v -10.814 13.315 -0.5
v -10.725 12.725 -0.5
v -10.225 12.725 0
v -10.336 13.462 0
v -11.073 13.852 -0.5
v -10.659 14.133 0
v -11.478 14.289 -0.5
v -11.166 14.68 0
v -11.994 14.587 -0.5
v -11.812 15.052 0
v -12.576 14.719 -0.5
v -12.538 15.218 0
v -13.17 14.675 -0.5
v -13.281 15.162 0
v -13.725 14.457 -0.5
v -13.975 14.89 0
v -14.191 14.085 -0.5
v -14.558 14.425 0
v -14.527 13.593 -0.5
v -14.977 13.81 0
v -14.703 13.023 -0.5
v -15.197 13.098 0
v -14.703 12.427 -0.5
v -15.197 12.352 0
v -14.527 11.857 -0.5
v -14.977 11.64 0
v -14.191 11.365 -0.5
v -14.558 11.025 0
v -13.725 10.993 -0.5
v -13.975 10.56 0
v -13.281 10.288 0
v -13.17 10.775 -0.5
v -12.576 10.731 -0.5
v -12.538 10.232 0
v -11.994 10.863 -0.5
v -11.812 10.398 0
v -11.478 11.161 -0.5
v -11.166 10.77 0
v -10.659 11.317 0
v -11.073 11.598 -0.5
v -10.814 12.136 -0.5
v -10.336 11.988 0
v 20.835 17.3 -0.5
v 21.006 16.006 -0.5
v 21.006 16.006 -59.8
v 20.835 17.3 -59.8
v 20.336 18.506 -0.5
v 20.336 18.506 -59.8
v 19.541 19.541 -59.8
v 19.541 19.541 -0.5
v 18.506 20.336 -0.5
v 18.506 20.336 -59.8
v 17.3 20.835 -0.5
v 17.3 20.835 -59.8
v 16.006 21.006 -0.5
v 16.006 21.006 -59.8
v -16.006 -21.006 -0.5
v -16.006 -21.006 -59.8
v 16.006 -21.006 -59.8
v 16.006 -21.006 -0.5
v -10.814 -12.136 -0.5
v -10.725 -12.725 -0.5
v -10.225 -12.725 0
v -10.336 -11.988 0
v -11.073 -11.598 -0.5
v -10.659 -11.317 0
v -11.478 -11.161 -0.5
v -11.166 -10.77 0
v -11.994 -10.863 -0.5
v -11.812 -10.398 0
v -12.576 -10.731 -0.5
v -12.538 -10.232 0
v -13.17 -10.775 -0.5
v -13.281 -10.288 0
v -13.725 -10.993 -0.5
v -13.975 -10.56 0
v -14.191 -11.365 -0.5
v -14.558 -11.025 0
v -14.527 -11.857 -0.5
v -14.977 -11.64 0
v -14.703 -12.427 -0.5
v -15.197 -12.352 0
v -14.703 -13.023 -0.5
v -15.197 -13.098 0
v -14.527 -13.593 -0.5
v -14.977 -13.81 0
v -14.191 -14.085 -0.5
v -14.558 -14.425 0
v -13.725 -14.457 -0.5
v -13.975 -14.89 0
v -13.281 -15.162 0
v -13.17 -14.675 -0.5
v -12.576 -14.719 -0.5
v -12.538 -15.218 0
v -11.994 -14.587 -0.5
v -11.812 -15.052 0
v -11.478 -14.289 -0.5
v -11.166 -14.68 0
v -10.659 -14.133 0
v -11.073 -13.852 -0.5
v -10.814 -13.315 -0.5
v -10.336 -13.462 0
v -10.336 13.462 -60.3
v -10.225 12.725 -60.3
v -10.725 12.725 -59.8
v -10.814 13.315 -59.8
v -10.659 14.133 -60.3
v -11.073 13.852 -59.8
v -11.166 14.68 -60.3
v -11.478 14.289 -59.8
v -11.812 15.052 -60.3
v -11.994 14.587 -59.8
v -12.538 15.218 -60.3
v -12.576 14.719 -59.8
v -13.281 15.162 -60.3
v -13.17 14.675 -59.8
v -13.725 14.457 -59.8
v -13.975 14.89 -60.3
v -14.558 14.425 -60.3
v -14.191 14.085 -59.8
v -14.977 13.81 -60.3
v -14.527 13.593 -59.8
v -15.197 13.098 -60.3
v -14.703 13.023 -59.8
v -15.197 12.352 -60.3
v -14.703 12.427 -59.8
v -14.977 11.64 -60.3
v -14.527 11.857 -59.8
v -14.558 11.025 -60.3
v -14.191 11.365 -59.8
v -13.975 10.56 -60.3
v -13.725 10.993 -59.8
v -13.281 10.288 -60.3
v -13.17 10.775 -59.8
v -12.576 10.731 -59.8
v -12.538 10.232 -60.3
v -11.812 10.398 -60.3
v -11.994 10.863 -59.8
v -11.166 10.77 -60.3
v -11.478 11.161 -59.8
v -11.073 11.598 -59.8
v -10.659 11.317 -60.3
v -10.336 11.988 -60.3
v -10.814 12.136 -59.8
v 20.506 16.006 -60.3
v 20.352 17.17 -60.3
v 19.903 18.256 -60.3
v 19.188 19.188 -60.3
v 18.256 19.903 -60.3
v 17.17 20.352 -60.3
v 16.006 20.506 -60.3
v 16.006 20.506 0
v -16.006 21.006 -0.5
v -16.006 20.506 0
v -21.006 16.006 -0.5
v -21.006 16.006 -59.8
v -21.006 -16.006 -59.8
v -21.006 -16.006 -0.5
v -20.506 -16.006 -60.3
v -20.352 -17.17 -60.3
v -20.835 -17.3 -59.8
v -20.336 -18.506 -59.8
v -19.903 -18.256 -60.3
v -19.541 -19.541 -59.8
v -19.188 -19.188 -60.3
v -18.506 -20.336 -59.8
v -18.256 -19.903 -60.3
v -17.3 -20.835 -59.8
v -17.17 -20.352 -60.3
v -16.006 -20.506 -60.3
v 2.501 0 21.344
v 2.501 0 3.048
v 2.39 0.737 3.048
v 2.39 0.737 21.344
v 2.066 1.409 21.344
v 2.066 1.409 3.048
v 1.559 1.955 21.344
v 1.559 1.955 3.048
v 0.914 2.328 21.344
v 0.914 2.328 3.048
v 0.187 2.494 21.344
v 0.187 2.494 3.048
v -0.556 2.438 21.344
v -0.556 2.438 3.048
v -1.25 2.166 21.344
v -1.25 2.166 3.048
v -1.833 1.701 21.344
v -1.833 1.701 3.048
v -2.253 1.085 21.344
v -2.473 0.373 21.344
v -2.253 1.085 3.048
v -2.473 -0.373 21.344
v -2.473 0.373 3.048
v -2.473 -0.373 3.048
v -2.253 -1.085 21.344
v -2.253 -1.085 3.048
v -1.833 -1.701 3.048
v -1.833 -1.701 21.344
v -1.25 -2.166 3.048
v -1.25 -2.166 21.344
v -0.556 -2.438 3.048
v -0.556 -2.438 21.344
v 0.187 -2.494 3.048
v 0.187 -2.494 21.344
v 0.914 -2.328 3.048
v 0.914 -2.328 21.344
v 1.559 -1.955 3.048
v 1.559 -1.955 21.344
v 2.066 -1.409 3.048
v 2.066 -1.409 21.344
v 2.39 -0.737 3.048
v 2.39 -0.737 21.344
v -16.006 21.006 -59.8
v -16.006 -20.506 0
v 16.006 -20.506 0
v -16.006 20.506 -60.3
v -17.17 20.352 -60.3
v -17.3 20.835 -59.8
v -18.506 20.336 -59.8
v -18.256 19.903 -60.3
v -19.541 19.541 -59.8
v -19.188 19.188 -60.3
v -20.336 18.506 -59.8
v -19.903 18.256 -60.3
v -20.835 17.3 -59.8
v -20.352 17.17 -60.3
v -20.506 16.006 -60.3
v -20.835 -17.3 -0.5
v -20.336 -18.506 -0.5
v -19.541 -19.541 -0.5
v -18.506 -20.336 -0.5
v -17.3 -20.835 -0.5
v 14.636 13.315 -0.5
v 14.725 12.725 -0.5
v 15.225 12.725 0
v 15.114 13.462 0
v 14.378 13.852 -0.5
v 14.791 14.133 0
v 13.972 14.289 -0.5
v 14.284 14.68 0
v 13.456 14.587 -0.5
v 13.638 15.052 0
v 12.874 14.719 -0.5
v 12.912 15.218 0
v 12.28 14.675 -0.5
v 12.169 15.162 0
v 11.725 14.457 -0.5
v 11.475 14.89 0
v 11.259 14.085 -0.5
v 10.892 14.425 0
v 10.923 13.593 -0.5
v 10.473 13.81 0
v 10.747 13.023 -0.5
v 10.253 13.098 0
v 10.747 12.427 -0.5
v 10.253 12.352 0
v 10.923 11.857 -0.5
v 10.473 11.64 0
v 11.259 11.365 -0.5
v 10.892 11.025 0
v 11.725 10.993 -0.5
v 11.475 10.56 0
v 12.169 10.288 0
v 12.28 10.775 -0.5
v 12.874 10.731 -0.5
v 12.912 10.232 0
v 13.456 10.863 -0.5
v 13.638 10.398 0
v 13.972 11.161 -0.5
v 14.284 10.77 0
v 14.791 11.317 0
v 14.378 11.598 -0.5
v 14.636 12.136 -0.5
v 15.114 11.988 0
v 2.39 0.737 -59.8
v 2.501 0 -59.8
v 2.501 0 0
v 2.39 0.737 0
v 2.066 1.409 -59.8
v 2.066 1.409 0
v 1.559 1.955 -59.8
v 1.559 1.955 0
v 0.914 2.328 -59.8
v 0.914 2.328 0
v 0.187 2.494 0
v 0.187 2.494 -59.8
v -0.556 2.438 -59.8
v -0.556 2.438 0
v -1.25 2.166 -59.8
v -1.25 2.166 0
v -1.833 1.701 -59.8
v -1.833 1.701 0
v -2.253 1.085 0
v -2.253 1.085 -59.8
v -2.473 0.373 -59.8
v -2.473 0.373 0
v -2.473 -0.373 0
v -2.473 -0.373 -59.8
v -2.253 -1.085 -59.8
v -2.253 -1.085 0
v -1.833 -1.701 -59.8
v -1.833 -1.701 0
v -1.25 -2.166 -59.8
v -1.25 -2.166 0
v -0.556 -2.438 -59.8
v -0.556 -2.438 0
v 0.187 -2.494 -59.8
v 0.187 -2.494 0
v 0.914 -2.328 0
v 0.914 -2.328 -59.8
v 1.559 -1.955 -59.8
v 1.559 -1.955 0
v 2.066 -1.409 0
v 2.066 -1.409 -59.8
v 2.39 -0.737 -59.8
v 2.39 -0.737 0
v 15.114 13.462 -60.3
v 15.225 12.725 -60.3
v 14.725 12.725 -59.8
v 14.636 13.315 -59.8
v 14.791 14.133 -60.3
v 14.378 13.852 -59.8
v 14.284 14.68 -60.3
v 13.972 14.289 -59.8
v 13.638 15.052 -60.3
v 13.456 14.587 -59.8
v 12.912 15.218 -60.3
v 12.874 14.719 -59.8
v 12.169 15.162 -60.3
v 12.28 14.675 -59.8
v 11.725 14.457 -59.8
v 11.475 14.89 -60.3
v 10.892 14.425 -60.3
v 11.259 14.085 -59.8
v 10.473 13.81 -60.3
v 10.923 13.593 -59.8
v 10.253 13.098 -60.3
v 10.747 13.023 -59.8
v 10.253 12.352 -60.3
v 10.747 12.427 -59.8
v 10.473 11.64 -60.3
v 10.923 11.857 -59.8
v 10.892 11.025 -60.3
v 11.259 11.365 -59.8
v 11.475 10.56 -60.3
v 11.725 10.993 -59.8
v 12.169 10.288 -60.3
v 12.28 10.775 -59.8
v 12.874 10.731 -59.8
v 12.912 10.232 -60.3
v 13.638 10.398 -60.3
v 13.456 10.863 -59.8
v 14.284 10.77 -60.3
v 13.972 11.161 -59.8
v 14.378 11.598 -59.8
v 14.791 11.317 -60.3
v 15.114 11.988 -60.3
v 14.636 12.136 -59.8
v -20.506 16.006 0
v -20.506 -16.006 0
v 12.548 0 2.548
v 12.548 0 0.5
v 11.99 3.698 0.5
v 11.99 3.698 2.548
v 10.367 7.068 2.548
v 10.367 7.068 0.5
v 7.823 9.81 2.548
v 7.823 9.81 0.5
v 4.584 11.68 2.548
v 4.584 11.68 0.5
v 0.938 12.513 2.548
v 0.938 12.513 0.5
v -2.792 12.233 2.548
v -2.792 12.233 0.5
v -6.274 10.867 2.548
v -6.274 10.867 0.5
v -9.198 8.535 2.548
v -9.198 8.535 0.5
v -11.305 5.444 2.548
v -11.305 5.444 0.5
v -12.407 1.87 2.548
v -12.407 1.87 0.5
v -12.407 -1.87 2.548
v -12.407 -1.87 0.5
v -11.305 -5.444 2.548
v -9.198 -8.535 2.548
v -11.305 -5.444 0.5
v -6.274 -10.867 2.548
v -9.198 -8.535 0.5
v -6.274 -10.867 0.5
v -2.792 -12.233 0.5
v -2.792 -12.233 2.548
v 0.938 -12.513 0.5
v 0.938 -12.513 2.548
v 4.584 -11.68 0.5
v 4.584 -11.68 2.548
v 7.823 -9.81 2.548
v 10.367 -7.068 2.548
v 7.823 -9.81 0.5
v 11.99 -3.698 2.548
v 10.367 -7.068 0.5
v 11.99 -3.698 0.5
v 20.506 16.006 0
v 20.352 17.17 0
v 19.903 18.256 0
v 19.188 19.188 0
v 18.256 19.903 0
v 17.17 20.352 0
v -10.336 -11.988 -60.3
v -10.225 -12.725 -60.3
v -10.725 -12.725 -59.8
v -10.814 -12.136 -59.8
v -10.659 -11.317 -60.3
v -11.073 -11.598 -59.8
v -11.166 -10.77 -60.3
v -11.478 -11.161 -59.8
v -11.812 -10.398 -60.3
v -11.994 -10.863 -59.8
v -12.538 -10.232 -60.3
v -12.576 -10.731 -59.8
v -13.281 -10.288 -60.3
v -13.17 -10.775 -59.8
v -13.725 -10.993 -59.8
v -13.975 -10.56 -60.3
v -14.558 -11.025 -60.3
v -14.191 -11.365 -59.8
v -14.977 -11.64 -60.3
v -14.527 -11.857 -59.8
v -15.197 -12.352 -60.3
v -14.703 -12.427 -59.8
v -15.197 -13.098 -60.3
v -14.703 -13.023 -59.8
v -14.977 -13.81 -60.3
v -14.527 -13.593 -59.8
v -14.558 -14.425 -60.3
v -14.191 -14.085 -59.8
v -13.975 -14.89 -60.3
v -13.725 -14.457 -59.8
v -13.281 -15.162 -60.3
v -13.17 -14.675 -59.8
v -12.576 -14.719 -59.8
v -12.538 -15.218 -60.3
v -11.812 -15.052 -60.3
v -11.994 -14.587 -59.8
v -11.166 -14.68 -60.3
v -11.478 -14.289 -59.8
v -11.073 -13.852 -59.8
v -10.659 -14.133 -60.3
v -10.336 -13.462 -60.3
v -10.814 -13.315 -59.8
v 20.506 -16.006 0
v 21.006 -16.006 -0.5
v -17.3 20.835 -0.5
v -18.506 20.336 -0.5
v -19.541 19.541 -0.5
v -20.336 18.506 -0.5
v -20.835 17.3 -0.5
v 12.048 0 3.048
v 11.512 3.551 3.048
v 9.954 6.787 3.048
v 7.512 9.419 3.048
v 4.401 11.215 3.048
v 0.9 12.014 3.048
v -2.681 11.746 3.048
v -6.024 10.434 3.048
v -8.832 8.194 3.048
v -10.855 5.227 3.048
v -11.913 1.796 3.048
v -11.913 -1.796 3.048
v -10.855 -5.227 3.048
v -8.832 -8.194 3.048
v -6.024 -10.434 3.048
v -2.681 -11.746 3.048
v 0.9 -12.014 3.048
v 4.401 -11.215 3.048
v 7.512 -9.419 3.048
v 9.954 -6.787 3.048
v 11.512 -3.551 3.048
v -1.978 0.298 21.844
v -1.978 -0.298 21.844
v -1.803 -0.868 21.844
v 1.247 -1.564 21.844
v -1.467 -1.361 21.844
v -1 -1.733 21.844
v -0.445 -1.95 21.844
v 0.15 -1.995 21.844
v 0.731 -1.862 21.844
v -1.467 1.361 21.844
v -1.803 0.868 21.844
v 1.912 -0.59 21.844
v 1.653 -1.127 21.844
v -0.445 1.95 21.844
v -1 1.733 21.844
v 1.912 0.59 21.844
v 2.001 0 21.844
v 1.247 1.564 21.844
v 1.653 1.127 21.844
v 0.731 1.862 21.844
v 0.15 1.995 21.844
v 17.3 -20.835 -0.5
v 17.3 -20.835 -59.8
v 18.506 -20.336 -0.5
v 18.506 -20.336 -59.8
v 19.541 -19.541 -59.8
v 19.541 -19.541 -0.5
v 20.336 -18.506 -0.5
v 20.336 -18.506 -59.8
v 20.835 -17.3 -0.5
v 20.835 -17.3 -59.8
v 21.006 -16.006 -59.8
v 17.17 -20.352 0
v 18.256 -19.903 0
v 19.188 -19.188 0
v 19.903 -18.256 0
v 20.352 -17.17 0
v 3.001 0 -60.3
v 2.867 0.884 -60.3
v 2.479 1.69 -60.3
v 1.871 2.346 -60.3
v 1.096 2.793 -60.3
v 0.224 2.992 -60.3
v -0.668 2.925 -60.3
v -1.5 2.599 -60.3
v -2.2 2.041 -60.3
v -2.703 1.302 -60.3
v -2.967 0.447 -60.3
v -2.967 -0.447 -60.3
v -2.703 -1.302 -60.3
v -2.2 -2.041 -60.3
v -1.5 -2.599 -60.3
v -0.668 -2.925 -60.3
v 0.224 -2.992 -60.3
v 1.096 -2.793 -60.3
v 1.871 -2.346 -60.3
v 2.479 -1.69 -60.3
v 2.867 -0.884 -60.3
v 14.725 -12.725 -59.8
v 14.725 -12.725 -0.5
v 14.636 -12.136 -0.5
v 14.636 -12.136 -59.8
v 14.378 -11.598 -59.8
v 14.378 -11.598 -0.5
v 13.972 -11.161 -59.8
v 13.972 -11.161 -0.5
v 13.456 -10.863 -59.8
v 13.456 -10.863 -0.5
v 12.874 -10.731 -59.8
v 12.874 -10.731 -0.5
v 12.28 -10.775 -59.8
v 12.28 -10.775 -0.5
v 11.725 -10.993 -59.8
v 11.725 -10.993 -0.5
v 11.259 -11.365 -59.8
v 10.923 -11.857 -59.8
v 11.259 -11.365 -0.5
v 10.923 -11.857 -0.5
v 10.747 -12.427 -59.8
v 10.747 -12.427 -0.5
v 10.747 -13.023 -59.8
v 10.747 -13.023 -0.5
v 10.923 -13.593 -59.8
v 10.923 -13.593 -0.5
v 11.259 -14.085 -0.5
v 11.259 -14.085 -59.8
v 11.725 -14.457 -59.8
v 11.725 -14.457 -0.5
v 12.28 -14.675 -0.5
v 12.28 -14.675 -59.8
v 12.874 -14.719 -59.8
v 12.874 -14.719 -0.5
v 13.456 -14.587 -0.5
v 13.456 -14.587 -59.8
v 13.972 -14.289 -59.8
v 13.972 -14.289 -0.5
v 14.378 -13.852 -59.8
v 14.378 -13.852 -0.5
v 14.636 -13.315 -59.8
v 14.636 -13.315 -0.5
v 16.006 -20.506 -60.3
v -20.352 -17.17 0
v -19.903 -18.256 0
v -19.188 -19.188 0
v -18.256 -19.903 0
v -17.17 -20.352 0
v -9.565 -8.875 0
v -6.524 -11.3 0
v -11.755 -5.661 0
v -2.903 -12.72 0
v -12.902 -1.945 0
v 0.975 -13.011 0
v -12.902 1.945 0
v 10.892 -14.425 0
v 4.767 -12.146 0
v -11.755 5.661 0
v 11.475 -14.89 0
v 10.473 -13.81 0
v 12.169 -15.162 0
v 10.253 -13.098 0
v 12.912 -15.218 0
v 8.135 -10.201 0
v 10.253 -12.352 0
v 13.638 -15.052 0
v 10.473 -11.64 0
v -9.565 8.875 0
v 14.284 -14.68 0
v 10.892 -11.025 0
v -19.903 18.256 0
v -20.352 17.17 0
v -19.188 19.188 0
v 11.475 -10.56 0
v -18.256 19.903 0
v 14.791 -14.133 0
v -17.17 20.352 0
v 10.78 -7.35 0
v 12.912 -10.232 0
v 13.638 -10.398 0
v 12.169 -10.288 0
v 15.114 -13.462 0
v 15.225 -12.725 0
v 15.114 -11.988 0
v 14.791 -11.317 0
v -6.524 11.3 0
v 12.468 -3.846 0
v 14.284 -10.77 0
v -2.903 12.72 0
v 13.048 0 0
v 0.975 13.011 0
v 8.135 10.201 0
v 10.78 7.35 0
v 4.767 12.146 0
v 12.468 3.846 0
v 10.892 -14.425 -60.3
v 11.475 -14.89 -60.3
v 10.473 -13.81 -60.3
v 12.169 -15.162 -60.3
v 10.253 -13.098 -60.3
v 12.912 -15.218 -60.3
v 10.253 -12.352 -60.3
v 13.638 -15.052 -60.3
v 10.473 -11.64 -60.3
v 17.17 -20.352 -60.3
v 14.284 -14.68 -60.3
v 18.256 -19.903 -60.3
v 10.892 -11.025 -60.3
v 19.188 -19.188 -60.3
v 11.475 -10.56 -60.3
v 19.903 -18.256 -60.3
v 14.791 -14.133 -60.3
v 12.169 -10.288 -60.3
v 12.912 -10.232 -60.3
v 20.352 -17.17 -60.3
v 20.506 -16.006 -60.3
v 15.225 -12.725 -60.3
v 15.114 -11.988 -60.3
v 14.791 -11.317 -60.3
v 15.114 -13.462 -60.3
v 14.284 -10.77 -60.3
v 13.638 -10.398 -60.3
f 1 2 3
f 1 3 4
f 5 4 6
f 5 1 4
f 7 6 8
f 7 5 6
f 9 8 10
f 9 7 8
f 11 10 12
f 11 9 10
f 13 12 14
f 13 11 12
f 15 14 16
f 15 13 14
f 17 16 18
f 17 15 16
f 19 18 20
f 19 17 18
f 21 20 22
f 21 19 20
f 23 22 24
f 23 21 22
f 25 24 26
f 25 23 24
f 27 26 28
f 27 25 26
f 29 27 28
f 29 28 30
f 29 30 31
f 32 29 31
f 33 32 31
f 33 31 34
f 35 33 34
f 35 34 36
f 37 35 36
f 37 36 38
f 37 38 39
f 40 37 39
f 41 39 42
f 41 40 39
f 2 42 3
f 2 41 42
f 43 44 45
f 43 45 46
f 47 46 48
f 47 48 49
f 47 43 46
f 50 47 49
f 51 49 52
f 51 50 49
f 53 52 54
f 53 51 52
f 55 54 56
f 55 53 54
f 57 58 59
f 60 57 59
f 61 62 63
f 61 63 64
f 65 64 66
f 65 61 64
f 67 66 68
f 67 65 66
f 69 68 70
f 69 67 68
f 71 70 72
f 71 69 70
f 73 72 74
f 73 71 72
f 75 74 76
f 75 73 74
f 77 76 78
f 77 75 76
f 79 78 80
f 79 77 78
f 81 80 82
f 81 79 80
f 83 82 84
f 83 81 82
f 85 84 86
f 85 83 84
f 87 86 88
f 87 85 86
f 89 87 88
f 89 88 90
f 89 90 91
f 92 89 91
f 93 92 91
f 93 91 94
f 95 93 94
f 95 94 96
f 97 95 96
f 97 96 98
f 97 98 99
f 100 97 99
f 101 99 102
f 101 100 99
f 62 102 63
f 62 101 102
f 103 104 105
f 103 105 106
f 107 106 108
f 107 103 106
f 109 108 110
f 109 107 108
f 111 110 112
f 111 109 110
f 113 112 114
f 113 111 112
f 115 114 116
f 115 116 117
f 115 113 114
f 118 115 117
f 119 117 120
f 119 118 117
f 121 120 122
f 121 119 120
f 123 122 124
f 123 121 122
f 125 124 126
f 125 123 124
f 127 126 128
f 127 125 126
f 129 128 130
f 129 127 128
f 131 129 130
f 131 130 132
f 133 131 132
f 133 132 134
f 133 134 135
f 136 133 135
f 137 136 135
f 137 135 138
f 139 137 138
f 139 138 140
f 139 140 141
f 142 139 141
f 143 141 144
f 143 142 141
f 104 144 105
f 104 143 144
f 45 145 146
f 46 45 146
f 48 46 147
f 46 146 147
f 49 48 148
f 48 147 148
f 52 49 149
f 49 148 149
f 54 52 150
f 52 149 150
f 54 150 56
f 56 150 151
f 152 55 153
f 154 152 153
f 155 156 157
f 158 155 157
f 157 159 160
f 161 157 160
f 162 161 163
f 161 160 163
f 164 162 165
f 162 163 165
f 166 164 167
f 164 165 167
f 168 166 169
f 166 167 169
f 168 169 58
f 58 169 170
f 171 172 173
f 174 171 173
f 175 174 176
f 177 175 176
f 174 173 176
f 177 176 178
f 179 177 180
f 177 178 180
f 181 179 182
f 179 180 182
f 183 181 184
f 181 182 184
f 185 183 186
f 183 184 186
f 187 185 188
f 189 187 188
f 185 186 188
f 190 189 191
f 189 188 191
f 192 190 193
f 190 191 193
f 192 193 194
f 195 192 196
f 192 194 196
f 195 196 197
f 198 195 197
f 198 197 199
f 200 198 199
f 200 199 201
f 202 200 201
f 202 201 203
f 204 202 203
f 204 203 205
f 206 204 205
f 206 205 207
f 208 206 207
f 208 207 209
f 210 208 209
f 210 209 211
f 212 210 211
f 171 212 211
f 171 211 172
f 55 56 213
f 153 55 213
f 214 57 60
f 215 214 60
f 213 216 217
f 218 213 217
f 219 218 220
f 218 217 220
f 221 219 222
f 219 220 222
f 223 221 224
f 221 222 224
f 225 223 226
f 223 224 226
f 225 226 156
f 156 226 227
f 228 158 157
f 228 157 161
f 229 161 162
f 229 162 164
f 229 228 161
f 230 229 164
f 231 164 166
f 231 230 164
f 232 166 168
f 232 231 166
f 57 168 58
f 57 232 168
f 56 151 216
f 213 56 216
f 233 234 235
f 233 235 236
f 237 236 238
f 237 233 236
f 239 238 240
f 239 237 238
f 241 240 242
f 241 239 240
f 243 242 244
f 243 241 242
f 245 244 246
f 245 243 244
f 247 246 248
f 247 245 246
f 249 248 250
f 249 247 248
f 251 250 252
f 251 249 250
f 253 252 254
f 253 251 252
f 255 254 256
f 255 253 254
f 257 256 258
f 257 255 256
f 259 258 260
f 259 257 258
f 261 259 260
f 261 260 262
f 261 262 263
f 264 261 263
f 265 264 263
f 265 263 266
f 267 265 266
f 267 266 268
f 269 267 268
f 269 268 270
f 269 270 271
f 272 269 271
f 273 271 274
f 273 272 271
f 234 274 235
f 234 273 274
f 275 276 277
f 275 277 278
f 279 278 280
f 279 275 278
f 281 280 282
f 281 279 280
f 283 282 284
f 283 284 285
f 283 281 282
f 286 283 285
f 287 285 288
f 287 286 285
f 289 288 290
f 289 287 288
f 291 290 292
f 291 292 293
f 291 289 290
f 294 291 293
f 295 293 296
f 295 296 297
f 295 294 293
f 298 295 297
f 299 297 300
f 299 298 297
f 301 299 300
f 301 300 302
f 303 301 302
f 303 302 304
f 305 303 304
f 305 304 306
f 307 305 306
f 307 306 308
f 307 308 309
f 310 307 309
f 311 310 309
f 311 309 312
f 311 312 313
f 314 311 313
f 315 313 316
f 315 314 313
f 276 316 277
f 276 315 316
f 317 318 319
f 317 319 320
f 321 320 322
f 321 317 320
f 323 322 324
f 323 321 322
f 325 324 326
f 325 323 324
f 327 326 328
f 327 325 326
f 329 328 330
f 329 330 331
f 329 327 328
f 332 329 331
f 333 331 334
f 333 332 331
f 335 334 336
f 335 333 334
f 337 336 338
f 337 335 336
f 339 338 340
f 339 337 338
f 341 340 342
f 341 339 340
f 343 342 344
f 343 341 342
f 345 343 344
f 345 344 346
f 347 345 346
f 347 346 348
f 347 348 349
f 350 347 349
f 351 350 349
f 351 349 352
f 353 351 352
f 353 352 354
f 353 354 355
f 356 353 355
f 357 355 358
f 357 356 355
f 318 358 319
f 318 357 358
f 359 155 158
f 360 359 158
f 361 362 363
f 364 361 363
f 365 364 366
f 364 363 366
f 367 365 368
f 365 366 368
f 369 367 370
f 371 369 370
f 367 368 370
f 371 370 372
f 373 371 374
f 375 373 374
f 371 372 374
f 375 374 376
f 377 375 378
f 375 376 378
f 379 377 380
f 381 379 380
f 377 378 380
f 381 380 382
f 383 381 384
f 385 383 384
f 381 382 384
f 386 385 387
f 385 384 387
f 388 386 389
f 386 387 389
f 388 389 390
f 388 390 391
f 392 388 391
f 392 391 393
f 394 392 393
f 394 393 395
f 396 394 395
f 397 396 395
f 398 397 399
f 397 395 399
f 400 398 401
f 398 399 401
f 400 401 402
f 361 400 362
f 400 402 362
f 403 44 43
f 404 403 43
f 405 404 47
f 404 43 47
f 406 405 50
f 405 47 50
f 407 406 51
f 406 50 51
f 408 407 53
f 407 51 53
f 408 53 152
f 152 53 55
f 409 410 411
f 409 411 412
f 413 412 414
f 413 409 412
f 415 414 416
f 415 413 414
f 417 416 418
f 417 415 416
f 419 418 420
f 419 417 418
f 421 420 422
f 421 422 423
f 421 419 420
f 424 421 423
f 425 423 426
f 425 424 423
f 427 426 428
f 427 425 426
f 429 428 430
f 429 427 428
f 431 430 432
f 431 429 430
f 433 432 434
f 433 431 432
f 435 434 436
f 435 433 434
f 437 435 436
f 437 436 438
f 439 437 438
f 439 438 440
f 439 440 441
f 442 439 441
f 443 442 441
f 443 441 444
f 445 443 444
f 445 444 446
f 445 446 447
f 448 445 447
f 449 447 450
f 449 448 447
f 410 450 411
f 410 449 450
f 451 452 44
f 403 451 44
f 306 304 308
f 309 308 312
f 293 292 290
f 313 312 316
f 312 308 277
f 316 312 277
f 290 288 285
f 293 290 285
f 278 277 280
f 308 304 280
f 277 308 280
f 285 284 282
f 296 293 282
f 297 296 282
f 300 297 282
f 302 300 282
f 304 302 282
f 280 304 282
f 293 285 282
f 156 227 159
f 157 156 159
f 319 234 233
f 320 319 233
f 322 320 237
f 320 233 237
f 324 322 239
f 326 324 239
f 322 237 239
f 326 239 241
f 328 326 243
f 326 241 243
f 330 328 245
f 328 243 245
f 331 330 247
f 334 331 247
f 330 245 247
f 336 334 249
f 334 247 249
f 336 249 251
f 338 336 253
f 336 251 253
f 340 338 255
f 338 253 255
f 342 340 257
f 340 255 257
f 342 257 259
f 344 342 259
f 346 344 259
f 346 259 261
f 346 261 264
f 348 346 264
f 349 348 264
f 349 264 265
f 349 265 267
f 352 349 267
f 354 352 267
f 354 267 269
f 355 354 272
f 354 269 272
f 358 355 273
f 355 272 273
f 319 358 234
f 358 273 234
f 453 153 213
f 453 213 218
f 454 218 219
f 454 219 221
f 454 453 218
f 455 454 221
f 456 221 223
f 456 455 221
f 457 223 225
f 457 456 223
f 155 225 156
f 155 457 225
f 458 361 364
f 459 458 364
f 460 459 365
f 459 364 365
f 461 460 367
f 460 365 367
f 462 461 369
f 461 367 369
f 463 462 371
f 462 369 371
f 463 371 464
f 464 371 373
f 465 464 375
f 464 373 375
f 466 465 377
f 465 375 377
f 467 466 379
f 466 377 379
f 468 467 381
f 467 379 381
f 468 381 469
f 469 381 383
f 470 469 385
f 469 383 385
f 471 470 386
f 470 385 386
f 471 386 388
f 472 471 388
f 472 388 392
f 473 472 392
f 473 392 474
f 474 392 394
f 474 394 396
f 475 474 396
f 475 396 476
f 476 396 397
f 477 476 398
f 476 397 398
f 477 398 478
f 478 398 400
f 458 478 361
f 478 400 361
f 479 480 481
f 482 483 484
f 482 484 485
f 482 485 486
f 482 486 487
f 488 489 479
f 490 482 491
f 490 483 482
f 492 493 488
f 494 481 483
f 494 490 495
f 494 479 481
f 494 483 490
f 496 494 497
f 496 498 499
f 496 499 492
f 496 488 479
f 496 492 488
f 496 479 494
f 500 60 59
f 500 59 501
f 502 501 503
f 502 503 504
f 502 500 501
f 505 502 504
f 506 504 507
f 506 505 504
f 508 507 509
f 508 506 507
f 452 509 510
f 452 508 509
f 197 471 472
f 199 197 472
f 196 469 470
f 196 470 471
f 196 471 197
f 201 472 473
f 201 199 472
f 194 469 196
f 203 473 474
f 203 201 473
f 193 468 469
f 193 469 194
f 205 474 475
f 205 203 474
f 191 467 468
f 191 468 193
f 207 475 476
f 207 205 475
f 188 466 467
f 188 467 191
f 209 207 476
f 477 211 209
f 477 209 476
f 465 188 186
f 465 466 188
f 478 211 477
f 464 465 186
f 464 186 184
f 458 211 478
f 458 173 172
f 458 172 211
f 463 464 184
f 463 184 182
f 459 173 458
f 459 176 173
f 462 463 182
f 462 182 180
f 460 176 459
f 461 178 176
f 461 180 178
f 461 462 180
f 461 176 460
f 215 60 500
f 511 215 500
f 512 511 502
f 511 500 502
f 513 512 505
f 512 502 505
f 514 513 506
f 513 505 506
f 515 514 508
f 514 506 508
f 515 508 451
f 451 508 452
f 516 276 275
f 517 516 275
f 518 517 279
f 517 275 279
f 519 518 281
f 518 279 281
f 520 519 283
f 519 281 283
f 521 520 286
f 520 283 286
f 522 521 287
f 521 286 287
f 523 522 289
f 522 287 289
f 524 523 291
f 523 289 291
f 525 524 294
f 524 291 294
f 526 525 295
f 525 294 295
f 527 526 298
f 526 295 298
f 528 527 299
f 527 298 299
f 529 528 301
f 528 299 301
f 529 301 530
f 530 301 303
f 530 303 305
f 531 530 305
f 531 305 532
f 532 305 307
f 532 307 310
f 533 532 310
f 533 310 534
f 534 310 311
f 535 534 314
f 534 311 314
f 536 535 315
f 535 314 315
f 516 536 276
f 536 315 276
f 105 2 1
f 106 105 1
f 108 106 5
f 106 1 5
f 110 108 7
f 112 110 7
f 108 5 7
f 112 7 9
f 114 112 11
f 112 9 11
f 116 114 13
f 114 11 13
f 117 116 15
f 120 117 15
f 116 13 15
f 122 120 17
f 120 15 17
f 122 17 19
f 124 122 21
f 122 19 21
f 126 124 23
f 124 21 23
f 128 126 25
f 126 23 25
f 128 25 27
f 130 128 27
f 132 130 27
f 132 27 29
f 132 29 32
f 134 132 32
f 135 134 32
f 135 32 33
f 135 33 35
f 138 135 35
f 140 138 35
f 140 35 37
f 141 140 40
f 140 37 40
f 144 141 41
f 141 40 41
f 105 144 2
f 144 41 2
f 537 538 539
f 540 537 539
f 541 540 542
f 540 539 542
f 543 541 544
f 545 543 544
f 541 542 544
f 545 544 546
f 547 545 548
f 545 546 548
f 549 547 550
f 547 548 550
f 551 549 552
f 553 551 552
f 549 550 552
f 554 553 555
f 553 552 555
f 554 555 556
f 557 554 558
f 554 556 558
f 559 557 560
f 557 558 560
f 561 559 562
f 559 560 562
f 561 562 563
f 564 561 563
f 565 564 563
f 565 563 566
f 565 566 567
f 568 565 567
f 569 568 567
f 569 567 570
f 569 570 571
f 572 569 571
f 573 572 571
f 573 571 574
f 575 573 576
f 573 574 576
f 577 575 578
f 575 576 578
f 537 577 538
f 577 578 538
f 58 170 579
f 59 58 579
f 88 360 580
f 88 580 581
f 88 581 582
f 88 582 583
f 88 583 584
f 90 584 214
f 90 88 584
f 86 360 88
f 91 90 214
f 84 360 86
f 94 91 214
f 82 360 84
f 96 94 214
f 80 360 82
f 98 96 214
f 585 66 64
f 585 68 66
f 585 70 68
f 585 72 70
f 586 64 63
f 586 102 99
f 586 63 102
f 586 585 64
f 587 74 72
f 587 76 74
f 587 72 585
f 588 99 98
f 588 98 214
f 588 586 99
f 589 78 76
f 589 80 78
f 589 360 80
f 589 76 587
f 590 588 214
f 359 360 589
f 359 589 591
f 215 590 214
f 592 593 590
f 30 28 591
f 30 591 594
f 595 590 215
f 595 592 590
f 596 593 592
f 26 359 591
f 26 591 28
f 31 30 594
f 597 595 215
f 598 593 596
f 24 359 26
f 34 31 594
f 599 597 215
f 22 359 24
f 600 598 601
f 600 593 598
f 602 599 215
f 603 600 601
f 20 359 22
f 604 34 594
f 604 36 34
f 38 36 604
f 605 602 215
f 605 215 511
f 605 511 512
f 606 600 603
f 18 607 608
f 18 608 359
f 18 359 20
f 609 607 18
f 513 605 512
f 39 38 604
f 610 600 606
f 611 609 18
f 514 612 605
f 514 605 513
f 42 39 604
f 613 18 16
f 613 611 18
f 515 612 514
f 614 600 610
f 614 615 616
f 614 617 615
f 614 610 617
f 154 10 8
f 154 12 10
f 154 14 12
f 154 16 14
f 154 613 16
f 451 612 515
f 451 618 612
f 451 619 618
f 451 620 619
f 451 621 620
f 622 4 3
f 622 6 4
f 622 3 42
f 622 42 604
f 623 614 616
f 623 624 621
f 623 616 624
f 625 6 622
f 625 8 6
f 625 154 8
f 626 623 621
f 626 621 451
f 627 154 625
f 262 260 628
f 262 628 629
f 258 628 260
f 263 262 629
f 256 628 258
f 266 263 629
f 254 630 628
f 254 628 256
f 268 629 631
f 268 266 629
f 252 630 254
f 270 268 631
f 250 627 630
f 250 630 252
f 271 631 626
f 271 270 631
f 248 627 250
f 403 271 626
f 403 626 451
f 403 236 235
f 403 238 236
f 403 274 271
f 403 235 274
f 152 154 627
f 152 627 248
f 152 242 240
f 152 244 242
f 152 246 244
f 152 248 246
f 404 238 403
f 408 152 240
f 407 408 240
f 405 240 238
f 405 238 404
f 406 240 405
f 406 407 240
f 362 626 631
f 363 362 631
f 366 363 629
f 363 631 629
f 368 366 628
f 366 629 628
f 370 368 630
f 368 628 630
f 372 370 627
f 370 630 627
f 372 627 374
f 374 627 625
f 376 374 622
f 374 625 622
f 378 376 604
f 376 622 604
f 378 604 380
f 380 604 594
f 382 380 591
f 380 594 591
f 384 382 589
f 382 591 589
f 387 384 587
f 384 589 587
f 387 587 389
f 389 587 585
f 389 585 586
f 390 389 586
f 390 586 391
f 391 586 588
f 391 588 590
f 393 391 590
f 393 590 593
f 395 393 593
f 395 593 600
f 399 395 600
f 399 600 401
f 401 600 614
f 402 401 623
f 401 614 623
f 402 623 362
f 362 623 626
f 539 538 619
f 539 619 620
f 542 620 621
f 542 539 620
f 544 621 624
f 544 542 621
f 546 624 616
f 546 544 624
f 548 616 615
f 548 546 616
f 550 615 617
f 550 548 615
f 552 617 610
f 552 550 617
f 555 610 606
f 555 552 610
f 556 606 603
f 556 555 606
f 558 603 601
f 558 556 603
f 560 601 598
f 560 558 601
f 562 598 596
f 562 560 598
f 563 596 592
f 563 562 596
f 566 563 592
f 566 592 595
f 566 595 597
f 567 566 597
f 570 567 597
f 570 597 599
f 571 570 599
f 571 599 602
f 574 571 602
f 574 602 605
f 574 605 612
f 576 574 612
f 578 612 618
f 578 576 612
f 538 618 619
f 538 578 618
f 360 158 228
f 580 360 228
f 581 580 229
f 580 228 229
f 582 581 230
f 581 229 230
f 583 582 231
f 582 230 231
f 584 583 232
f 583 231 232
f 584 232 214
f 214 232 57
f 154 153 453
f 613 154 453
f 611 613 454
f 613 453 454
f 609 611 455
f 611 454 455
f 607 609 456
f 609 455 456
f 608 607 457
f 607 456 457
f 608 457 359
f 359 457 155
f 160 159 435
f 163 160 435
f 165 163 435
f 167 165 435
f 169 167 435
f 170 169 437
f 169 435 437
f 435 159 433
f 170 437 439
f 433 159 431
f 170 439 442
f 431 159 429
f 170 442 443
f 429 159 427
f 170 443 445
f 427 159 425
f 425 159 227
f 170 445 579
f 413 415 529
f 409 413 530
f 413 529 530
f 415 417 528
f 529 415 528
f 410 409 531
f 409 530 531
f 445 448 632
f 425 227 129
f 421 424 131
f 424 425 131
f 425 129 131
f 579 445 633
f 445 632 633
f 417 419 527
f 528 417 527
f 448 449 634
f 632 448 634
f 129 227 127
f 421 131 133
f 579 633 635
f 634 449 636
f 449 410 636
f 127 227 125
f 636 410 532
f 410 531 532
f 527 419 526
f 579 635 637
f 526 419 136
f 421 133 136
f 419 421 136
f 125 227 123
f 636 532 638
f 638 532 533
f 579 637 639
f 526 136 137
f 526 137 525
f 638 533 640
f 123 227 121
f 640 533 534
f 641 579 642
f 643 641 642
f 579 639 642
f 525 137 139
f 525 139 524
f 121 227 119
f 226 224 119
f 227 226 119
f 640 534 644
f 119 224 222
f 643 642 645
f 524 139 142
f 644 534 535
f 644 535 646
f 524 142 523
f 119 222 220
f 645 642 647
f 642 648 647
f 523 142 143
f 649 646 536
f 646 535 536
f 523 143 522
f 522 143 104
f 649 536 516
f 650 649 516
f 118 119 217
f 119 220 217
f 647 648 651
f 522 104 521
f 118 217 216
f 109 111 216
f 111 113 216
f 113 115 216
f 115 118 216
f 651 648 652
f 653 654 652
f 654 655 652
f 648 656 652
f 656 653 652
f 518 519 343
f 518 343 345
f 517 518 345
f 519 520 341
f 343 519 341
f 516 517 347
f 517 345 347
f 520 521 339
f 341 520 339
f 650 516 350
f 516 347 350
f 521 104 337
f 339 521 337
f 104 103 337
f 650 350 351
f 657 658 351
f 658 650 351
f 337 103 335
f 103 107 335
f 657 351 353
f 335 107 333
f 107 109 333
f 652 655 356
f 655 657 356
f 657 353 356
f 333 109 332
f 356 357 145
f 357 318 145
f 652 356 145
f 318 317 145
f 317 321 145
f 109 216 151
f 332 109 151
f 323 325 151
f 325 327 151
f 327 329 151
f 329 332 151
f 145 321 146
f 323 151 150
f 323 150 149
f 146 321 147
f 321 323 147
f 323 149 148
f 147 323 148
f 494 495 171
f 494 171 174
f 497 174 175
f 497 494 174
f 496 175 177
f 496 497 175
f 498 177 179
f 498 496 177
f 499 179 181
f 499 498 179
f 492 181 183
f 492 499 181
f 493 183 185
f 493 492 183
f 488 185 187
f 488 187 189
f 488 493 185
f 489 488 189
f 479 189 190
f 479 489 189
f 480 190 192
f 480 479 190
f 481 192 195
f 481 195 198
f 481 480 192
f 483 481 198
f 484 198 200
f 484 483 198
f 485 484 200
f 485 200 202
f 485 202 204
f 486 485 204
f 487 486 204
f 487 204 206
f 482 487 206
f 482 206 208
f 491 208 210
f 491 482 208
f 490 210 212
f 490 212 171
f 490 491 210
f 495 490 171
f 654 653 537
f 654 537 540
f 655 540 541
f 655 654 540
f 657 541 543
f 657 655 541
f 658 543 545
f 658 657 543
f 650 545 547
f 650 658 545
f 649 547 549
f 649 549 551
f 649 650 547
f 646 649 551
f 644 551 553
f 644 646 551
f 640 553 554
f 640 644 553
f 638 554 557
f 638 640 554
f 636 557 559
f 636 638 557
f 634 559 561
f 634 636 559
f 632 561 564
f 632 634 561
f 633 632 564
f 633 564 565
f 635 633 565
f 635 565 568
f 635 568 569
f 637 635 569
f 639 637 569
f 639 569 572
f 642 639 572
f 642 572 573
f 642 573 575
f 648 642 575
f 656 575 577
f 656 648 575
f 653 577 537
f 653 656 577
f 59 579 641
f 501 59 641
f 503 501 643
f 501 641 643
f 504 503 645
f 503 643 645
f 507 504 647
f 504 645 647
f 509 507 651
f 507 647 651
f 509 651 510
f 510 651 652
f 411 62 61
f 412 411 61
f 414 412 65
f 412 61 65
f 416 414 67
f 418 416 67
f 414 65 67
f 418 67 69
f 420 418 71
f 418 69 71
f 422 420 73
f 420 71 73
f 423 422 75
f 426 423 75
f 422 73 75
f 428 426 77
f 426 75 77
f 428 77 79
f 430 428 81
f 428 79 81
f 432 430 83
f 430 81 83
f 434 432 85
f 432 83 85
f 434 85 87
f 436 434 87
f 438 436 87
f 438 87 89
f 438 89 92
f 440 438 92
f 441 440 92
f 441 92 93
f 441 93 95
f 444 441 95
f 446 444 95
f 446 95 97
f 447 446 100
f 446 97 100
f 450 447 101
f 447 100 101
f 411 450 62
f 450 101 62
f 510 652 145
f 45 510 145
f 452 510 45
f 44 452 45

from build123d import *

# Parameters (mm, degrees)
F0_R     = 2
F0_R_2   = 12.5476
F0_R_3   = 2.50063
F1_DEPTH = 60.3
F2_DEPTH = 3.048
F3_DEPTH = 21.844
F4_SIZE  = 0.5


with BuildPart() as f1:
    # F0 (on Top) → F1 (new body)
    with BuildSketch(Plane.XY):
        with BuildLine():
            ThreePointArc((21.0058, 16.0058), (19.541334, 19.541334), (16.0058, 21.0058))
            Line((16.0058, 21.0058), (-16.0058, 21.0058))
            ThreePointArc((-16.0058, 21.0058), (-19.541334, 19.541334), (-21.0058, 16.0058))
            Line((-21.0058, 16.0058), (-21.0058, -16.0058))
            ThreePointArc((-21.0058, -16.0058), (-19.541334, -19.541334), (-16.0058, -21.0058))
            Line((-16.0058, -21.0058), (16.0058, -21.0058))
            ThreePointArc((16.0058, -21.0058), (19.541334, -19.541334), (21.0058, -16.0058))
            Line((21.0058, -16.0058), (21.0058, 16.0058))
        make_face()
        with Locations((-12.725023, -12.725023)):
            Circle(F0_R, mode=Mode.SUBTRACT)
        with Locations((12.725023, -12.725023)):
            Circle(F0_R, mode=Mode.SUBTRACT)
        with Locations((-12.725023, 12.725023)):
            Circle(F0_R, mode=Mode.SUBTRACT)
        Circle(F0_R_2, mode=Mode.SUBTRACT)
        with Locations((12.725023, 12.725023)):
            Circle(F0_R, mode=Mode.SUBTRACT)
        Circle(F0_R_2)
        Circle(F0_R_3, mode=Mode.SUBTRACT)
    extrude(amount=-F1_DEPTH)

    # F0 (on Top) → F2 (join)
    with BuildSketch(Plane.XY):
        Circle(F0_R_2)
        Circle(F0_R_3, mode=Mode.SUBTRACT)
    extrude(amount=F2_DEPTH)

    # F0 (on Top) → F3 (join)
    with BuildSketch(Plane.XY):
        Circle(F0_R_3)
    extrude(amount=F3_DEPTH)

    # F4
    f4_edges = [f1.edges().sort_by_distance(p)[0] for p in [
        (-2.50063, 0, 21.844),
        (-12.5476, 0, 3.048),
        (-14.725023, -12.725023, 0),
        (-14.725023, 12.725023, 0),
        (10.725023, 12.725023, 0),
        (10.725023, -12.725023, 0),
        (19.541334, 19.541334, 0),
        (21.0058, 0, 0),
        (0, 21.0058, 0),
        (19.541334, -19.541334, 0),
        (-19.541334, 19.541334, 0),
        (0, -21.0058, 0),
        (-21.0058, 0, 0),
        (-19.541334, -19.541334, 0),
        (-12.5476, 0, 0),
        (19.541334, 19.541334, -60.3),
        (0, 21.0058, -60.3),
        (-19.541334, 19.541334, -60.3),
        (-21.0058, 0, -60.3),
        (-19.541334, -19.541334, -60.3),
        (0, -21.0058, -60.3),
        (19.541334, -19.541334, -60.3),
        (21.0058, 0, -60.3),
        (-14.725023, -12.725023, -60.3),
        (10.725023, -12.725023, -60.3),
        (-14.725023, 12.725023, -60.3),
        (10.725023, 12.725023, -60.3),
        (-2.50063, 0, -60.3),
    ]]
    chamfer(f4_edges, length=F4_SIZE)


solid = f1.part
